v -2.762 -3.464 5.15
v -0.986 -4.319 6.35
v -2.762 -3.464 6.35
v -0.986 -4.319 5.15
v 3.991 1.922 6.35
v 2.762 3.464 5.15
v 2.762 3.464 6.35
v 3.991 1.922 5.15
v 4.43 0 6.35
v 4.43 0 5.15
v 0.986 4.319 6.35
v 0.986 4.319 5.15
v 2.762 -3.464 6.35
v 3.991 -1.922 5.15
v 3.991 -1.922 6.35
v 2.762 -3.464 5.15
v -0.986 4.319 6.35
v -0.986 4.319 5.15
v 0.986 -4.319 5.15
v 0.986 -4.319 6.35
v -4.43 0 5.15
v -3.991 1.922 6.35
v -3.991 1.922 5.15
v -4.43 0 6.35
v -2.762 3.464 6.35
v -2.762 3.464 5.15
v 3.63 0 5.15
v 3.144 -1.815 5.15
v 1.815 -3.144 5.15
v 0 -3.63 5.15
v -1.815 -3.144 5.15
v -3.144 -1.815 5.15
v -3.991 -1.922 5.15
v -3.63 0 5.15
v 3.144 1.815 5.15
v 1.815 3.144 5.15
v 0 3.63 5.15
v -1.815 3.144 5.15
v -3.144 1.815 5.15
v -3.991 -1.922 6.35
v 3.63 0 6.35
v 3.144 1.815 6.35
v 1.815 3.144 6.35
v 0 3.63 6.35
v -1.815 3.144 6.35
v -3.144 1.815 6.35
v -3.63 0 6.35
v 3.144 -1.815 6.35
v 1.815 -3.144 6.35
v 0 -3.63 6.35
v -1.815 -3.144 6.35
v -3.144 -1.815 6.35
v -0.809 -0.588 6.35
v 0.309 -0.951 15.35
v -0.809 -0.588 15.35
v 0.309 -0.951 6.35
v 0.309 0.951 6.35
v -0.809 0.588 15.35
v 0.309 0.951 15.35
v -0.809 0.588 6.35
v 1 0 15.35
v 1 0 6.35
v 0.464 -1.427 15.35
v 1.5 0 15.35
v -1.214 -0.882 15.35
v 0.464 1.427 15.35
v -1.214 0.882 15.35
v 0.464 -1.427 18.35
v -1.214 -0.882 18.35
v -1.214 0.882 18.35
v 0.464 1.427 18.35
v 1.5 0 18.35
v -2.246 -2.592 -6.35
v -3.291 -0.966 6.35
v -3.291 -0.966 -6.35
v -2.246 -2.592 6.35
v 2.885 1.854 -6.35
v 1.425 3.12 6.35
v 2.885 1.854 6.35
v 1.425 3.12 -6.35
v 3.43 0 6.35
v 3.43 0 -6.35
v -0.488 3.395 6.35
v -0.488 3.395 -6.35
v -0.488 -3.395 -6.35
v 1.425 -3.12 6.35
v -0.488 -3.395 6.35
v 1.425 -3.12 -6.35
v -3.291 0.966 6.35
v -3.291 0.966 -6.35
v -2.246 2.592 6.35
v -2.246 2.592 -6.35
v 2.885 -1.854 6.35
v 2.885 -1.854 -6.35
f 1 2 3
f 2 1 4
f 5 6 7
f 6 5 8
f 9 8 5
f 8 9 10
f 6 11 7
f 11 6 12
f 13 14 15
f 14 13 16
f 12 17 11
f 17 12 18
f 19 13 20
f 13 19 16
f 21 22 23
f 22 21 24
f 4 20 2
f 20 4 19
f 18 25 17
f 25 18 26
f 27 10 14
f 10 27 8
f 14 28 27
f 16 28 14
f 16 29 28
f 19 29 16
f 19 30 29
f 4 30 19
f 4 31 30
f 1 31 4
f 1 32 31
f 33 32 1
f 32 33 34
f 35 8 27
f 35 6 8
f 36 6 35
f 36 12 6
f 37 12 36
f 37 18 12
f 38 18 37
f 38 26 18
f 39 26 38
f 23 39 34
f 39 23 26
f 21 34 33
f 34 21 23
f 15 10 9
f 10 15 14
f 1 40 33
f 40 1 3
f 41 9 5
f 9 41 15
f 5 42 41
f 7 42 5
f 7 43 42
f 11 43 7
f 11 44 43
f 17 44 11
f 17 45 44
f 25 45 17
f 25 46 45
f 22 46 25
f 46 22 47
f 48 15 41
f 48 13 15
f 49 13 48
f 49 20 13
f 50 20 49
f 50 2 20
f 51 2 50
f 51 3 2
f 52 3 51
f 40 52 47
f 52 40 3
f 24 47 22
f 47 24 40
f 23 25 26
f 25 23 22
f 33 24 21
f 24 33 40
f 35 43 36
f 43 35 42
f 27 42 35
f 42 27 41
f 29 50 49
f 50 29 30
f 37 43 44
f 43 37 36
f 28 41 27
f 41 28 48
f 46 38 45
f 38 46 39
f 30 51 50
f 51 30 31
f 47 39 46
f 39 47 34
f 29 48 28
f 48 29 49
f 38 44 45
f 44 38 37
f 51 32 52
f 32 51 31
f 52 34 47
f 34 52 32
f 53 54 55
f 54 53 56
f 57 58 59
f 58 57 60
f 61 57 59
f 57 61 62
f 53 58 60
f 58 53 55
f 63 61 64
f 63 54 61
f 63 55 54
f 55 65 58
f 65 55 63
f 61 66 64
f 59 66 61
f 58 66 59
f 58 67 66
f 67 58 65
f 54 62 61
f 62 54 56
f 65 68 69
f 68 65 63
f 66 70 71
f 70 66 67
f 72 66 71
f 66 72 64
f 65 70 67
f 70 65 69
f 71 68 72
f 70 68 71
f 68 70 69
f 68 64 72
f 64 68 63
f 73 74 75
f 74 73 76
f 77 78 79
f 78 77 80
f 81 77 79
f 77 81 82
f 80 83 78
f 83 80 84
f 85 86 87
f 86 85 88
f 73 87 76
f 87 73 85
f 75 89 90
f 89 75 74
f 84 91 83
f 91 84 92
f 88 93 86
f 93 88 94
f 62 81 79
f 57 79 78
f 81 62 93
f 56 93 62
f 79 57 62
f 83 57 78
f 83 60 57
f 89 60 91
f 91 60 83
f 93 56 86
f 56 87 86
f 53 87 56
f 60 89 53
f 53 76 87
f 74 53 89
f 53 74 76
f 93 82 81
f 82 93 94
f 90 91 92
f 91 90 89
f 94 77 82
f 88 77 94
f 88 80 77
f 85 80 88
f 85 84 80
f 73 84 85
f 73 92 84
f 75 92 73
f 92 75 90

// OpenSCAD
// Parameters
body_diameter_mm = 6.86; //[3.43:13.72:0.01]
body_height_mm = 12.7; //[6.35:25.4:0.01]
axis_ring_thickness_mm = 0.8; //[0.4:1.6:0.05]
axis_ring_height_mm = 1.2; //[0.6:2.4:0.05]
axis_ring_clearance_mm = 0.2; //[0.0:0.6:0.05]
toggle_shaft_diameter_mm = 2.0; //[1.0:4.0:0.05]
toggle_shaft_length_mm = 10.0; //[5.0:20.0:0.1]
toggle_tip_diameter_mm = 3.0; //[1.5:6.0:0.05]
toggle_tip_height_mm = 3.0; //[1.5:6.0:0.05]
toggle_overlap_mm = 1.0; //[0.5:2.0:0.1]
origin_centered_on_axis = 1; //[1:1:1]

// Toggle switch body
module toggle_switch_body() {
  color("DimGray") {
    cylinder(r=body_diameter_mm/2, h=body_height_mm, center=true);
  }
}

// Mounting axis reference ring
module mounting_axis_reference() {
  color("Silver") {
    difference() {
      translate([0, 0, body_height_mm/2 - axis_ring_height_mm/2])
        cylinder(r=body_diameter_mm/2 + axis_ring_clearance_mm + axis_ring_thickness_mm, 
                 h=axis_ring_height_mm, center=true);
      translate([0, 0, body_height_mm/2 - axis_ring_height_mm/2])
        cylinder(r=body_diameter_mm/2 + axis_ring_clearance_mm, 
                 h=axis_ring_height_mm + 2, center=true);
    }
  }
}

// Toggle lever
module toggle() {
  color("Black") {
    union() {
      translate([0, 0, body_height_mm/2 + toggle_shaft_length_mm/2 - toggle_overlap_mm])
        cylinder(r=toggle_shaft_diameter_mm/2, h=toggle_shaft_length_mm, center=true);
      translate([0, 0, body_height_mm/2 + toggle_shaft_length_mm - toggle_overlap_mm + toggle_tip_height_mm/2])
        cylinder(r=toggle_tip_diameter_mm/2, h=toggle_tip_height_mm, center=true);
    }
  }
}

// Complete toggle switch assembly
module assembly() {
  toggle_switch_body();
  mounting_axis_reference();
  toggle();
}

assembly();
